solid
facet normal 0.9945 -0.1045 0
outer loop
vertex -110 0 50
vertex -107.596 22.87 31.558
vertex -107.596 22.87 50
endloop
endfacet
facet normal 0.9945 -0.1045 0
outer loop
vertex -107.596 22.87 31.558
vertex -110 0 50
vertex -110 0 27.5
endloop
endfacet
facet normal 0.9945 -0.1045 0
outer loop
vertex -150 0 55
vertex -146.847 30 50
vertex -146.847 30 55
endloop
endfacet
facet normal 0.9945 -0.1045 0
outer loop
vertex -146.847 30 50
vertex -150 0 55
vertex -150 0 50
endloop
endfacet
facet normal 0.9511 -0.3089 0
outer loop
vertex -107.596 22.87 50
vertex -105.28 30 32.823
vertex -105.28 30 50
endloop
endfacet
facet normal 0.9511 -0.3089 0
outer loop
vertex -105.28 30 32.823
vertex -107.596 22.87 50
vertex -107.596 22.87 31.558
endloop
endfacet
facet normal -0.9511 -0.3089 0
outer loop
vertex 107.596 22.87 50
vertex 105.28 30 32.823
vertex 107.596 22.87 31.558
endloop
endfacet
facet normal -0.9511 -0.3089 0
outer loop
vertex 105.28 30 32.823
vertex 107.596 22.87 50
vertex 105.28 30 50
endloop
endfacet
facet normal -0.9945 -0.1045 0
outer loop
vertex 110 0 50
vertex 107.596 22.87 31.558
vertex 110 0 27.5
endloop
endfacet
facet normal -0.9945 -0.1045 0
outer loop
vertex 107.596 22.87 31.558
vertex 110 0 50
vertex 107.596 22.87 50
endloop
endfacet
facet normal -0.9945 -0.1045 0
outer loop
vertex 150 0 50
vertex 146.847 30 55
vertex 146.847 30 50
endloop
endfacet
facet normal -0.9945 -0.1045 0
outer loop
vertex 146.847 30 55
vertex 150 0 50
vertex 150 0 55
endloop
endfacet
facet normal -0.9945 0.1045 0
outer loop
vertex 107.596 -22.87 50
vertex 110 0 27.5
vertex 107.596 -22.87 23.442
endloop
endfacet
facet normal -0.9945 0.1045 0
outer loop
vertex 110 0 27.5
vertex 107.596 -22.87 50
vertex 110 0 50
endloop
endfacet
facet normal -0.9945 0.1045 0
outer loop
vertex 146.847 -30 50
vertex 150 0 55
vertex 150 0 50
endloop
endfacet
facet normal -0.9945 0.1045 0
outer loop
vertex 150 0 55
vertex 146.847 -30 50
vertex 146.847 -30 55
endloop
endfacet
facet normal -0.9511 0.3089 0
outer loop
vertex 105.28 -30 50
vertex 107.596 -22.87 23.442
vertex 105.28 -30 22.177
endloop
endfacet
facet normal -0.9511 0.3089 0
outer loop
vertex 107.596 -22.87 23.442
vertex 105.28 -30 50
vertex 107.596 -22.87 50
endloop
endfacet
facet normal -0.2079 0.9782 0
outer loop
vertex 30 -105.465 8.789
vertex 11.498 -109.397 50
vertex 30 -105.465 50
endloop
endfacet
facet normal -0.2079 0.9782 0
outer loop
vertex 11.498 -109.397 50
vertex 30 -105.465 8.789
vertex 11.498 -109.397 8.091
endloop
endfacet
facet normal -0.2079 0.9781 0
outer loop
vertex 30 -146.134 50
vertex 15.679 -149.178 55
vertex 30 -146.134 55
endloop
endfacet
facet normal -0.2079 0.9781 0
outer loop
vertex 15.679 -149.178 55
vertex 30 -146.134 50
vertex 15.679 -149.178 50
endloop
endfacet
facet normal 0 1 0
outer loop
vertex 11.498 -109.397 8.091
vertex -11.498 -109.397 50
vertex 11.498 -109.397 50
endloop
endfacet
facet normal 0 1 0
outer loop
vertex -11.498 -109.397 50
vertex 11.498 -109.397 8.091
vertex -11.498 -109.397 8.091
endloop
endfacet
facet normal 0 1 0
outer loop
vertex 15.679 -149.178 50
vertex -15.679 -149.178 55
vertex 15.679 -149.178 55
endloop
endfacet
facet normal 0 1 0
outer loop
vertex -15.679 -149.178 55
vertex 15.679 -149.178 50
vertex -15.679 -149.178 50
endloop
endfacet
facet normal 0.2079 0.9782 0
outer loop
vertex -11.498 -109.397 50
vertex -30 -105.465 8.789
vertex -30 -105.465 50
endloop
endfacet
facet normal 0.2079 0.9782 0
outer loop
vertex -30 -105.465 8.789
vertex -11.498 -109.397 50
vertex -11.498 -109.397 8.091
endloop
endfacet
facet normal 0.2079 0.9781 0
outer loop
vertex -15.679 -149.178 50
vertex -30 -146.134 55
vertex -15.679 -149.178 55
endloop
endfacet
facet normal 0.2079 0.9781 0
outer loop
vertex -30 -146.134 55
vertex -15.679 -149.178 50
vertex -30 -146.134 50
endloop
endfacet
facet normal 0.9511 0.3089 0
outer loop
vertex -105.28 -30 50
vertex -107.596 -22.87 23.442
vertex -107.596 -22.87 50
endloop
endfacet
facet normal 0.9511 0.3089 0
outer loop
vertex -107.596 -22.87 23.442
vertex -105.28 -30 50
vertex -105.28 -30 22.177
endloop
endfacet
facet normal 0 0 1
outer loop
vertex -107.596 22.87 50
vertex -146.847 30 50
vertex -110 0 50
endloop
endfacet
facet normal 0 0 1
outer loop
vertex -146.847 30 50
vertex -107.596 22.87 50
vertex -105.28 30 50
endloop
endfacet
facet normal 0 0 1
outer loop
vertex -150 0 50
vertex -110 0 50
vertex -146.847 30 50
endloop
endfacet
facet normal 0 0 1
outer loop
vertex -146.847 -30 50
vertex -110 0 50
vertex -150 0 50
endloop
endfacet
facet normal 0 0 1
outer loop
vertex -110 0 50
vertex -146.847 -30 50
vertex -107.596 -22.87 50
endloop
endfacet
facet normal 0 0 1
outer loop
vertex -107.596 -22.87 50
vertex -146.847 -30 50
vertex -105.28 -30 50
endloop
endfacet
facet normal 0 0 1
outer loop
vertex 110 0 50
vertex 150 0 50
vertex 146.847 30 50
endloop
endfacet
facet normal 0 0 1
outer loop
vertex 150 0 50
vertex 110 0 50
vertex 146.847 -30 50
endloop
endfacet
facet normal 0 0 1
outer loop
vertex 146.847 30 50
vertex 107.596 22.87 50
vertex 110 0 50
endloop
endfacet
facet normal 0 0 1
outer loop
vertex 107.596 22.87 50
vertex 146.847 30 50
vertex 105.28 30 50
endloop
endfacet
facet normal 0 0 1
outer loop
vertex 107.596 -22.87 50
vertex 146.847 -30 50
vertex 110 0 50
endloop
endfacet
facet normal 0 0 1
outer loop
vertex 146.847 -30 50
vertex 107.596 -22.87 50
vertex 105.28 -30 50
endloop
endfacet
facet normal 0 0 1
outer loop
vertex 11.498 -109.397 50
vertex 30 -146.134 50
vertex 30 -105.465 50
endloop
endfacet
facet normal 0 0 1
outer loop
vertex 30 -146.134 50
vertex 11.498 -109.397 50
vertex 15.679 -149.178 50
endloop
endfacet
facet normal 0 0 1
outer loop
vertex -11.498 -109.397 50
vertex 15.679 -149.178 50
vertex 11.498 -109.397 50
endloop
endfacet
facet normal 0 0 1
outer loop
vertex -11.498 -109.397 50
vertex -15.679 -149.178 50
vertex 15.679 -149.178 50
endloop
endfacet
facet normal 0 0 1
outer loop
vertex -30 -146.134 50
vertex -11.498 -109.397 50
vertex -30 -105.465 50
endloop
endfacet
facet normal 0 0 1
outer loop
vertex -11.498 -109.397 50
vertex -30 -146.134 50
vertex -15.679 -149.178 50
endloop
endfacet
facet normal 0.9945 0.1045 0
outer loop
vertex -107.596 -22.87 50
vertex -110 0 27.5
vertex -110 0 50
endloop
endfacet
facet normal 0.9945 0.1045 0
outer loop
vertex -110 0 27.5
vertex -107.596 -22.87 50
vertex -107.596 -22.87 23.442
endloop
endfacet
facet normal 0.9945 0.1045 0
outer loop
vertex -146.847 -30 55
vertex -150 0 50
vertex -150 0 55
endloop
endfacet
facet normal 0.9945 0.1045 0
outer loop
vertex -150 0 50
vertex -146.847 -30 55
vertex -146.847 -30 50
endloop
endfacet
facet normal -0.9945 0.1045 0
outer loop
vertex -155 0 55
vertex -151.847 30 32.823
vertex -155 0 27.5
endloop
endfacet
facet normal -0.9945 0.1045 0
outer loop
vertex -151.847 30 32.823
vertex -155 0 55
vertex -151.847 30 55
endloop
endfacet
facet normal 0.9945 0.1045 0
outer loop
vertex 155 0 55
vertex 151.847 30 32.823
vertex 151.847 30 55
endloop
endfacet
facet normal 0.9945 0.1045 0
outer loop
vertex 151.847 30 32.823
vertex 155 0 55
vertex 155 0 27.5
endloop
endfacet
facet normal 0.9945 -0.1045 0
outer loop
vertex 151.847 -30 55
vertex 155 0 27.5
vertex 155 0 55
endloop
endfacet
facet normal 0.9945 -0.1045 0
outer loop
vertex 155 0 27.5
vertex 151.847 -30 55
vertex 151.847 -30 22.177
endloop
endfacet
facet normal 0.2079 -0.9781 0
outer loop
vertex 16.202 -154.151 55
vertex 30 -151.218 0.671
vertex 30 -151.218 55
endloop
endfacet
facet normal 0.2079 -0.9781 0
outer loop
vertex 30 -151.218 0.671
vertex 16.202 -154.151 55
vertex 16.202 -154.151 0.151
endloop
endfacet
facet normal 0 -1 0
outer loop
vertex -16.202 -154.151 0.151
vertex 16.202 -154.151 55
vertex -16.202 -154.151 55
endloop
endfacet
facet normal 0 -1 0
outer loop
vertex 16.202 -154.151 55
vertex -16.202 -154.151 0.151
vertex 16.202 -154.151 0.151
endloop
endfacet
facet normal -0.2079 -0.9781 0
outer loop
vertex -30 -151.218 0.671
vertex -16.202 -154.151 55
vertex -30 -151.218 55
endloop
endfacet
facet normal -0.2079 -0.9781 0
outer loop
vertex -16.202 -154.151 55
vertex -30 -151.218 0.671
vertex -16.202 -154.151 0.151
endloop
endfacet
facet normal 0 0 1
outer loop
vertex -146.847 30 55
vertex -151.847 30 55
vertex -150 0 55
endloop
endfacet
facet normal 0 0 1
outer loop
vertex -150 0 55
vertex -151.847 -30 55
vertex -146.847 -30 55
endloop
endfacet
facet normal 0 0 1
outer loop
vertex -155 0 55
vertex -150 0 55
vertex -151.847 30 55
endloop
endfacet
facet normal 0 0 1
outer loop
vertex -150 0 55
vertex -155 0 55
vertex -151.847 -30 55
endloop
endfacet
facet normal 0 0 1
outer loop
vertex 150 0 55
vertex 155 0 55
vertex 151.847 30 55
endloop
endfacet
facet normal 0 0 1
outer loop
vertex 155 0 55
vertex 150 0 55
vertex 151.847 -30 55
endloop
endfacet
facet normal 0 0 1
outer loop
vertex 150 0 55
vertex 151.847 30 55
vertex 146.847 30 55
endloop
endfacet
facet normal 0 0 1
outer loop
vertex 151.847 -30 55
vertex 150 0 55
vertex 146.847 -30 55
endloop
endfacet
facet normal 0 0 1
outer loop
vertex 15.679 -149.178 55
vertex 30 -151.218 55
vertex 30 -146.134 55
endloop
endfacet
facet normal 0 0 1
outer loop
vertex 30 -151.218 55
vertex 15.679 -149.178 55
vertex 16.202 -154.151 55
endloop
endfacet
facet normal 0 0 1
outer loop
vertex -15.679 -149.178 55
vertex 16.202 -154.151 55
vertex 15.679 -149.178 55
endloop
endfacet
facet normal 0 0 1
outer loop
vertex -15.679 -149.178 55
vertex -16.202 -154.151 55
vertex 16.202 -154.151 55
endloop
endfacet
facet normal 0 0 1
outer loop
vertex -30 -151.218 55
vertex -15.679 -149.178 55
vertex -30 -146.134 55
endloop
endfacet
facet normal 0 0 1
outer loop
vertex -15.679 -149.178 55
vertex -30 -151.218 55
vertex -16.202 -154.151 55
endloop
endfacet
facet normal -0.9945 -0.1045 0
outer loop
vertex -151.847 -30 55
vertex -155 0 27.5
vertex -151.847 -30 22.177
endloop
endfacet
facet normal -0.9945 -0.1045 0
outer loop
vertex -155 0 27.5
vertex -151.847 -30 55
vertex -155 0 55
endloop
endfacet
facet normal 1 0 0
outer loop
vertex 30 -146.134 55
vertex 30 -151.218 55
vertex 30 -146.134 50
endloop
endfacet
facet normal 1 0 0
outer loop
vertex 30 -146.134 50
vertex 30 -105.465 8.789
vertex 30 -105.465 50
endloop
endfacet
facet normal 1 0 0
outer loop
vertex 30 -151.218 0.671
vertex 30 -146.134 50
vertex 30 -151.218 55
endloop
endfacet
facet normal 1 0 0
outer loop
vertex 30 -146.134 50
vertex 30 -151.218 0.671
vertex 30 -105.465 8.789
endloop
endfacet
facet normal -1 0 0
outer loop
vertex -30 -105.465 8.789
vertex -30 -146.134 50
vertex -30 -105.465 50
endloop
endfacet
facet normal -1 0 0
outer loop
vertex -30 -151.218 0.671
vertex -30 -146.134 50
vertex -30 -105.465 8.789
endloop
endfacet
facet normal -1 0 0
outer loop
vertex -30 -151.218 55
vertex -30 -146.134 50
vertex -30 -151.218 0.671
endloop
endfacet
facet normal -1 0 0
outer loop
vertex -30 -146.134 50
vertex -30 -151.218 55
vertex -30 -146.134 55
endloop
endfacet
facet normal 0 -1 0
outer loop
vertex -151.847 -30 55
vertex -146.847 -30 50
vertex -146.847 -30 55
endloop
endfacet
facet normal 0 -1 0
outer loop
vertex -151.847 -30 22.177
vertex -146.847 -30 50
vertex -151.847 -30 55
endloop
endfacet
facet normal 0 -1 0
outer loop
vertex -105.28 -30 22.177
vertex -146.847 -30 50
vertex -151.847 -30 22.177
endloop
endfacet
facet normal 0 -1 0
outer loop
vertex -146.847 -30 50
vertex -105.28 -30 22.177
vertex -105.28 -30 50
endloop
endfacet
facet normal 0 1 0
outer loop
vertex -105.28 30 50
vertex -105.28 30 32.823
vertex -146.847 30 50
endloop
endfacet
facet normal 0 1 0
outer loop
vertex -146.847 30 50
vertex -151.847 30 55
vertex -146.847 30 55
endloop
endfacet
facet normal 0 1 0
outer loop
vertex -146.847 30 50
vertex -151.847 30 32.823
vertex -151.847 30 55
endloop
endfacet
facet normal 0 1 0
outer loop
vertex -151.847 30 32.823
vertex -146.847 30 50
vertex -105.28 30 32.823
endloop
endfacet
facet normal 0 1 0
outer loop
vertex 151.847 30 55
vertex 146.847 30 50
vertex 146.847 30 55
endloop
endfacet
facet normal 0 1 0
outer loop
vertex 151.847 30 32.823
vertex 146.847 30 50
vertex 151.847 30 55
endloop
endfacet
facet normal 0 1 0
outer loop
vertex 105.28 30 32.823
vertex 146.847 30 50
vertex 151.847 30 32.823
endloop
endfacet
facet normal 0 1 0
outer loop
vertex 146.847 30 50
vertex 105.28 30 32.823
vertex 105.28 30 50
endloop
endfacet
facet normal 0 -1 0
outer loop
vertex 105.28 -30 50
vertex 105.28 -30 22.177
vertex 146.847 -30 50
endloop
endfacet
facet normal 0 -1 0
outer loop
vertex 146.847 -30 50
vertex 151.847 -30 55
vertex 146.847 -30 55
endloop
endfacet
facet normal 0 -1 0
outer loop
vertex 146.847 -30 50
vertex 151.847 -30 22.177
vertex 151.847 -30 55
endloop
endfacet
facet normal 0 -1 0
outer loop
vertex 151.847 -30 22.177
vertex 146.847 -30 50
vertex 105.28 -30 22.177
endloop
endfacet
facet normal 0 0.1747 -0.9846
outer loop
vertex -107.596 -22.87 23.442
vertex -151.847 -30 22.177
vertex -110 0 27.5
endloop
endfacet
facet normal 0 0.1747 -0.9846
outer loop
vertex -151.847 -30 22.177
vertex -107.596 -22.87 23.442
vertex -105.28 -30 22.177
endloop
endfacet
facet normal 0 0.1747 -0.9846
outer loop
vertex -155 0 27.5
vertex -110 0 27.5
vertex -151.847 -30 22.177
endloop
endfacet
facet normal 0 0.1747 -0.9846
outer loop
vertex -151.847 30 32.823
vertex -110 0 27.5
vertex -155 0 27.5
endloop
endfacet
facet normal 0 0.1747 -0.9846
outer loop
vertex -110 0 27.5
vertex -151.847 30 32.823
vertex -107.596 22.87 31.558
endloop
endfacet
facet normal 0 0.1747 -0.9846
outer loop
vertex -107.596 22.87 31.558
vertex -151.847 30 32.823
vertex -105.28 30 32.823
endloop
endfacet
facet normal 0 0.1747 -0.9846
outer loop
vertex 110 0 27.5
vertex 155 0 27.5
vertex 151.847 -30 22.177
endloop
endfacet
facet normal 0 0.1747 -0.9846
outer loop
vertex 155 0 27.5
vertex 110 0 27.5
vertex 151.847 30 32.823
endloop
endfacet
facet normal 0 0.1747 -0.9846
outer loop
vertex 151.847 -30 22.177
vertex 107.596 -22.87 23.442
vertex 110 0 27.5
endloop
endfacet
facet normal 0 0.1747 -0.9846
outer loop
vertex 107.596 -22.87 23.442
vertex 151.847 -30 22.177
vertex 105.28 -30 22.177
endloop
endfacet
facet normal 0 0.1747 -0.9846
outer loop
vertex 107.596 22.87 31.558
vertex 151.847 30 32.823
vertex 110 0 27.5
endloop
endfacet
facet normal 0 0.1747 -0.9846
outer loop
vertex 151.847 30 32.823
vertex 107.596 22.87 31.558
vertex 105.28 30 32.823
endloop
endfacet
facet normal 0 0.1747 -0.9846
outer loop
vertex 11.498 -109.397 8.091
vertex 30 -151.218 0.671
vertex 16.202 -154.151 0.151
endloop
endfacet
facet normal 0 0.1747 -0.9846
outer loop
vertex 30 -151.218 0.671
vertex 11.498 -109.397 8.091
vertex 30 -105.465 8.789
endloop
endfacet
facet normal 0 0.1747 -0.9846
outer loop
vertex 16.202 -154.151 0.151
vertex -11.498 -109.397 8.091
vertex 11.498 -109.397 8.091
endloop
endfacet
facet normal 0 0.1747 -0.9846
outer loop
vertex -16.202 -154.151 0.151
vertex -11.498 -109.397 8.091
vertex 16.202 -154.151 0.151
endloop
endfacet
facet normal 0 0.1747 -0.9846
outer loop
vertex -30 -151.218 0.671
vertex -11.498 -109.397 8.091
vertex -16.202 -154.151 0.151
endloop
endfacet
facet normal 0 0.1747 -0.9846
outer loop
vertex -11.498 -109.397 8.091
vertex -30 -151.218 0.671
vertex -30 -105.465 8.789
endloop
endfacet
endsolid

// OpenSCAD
/** Create Wedge **/
/*      
Universal Adjustabel Wedge by Chris Schaefer is licensed under the Creative Commons - Attribution - Non-Commercial license. 
*/

// MB Interface

/* [Gap] */
// Bottom Pot Diameter
Diameter=300;
// how high is the gap? equals the wedge hight
Gap_Height=50;

/* [Wedge Size] */
// how wide is the wedge?
Wedge_Width=60;
// Depth of the wedge, going under the pot
Wedge_Depth=40;

// Should the wedge have edges to prevent rolling off?
/* [Edge] */
// the width will be added around the wedge
Edge_Width=5.0;
// the hight will be added to the gap size.
Edge_Height=5.0;


// Interface End
/* [Hidden] */
// Length
LEN=Diameter; 
// Gap 
GAP=Gap_Height;

// Block size
/* [Block Size] */
// width (width at the max hight)
X=Wedge_Width;
// length (length along the slope)      
Y=Wedge_Depth;

// edge around the block to stop rolling off
EDGE=Edge_Width;    // edge border thickness
EDGE_H=Edge_Height;  // hight of the edge

// ========================================================
// Block is:
module block () {
    // Block size
    cube(size = [ X, Y, GAP ], center = false);
    // Edge added
    translate([-EDGE, -EDGE, 0])
        difference ()
          {
            cube(size = [ X+2*EDGE, Y+2*EDGE, GAP+EDGE_H ], center = false);
            translate ([EDGE, EDGE,0])
              cube(size = [ X, Y, GAP+EDGE_H ], center = false);
          }
      }

module Circ () {
    color("red")
    rotate_extrude()
        translate([LEN/2-Y, 0])
           polygon( points=[[0,0],[0,GAP],[Y,GAP],[Y,0]]  );   
    color("blue")
    rotate_extrude()
        translate([LEN/2, 0])
           polygon( points=[[0,0],[0,GAP+EDGE_H],[EDGE,GAP+EDGE_H],[EDGE,0]]  );
}
module CircBlock () {
   color ("blue")
    rotate ([0,0,180]) 
        translate([-X/2, 0, 0]) cube(size = [ X, LEN/2+EDGE, GAP+EDGE_H ], center = false);
    rotate ([0,0,90]) 
        translate([-X/2, 0, 0]) cube(size = [ X, LEN/2+EDGE, GAP+EDGE_H ], center = false);
   rotate ([0,0,-90]) 
        translate([-X/2, 0, 0]) cube(size = [ X, LEN/2+EDGE, GAP+EDGE_H ], center = false);
}

module wedge () {
    // Wedge with the right slop
        // shift and rotate it into place
            translate ( [-LEN/2-EDGE,-LEN/2,GAP] )
            rotate ([0,90,0])
        // wedge
        linear_extrude(height = LEN+2*EDGE)
         polygon( points=[[-EDGE_H,-EDGE],[-EDGE_H,LEN+EDGE],[GAP,-EDGE]]  );
    
 }
 
// limit the block to the wedge, gives it the right slope.
intersection () 
 {
      Circ (); 
      CircBlock ();
     // block ();
     wedge ();
  }
  
